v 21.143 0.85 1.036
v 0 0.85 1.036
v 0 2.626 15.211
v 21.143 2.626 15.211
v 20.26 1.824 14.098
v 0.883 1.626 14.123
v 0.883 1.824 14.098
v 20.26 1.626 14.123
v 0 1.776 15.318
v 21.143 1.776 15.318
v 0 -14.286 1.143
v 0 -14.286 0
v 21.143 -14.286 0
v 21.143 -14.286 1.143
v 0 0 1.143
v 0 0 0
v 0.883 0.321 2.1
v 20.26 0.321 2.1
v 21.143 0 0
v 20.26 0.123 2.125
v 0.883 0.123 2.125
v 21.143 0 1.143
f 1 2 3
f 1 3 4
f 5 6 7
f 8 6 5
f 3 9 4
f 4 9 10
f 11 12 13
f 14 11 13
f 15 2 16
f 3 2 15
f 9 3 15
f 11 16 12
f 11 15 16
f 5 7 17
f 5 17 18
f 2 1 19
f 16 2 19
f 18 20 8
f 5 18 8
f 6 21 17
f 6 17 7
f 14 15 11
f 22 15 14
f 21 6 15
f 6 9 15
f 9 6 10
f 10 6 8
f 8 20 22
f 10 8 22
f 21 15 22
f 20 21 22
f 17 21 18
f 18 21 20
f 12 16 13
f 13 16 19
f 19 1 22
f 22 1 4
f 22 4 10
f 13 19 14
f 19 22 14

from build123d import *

# Parameters (mm, degrees)
F1_W     = 21.1428571429
F1_H     = 14.2857142857
F2_DEPTH = 1.1428571429
F3_W     = 21.1428571429
F3_H     = 14.2857142857
F4_DEPTH = 0.8571428571
F5_ANGLE = -97.1399716164
F7_DEPTH = 21.1428571429
F8_W     = 19.3768789759
F8_H     = 12.0920338668
F9_DEPTH = 0.2


with BuildPart() as f2:
    # F1 (on Top) → F2 (new body)
    with BuildSketch(Plane.XY):
        with Locations((10.5714285714, -7.1428571429)):
            Rectangle(F1_W, F1_H)
    extrude(amount=F2_DEPTH)



with BuildPart() as f4:
    # F3 (on face) → F4 (new body)
    with BuildSketch(Plane.XY.offset(1.1428571429)):
        with Locations((10.5714285714, -7.1428571429)):
            Rectangle(F3_W, F3_H)
    extrude(amount=F4_DEPTH)


with BuildPart() as f4_1:
    # F5: moved
    add(f4.part.rotate(Axis((10.5714285714, 0, 1.1428571429), (1, 0, 0)), F5_ANGLE))


with BuildPart() as f2_1:
    add(f2.part)

    add(f4_1.part)  # F7 merges F4
    # F6 (on face) → F7 (join, through all)
    with BuildSketch(Plane(origin=(0, 0, 0), x_dir=(0, -1, 0), z_dir=(-1, 0, 0))):
        Polygon((-0.850496115, 1.0363196571), (0, 0), (0, 1.1428571429), align=None)
    extrude(amount=-F7_DEPTH)

    # F8 (on face) → F9 (cut)
    with BuildSketch(Plane(origin=(0, -0.1409484498, 0.0176559225), x_dir=(1, 0, 0), z_dir=(0, -0.9922454675, 0.1242937334))):
        with Locations((10.5714288657, 8.1697662827)):
            Rectangle(F8_W, F8_H)
    extrude(amount=-F9_DEPTH, mode=Mode.SUBTRACT)


solid = f2_1.part
